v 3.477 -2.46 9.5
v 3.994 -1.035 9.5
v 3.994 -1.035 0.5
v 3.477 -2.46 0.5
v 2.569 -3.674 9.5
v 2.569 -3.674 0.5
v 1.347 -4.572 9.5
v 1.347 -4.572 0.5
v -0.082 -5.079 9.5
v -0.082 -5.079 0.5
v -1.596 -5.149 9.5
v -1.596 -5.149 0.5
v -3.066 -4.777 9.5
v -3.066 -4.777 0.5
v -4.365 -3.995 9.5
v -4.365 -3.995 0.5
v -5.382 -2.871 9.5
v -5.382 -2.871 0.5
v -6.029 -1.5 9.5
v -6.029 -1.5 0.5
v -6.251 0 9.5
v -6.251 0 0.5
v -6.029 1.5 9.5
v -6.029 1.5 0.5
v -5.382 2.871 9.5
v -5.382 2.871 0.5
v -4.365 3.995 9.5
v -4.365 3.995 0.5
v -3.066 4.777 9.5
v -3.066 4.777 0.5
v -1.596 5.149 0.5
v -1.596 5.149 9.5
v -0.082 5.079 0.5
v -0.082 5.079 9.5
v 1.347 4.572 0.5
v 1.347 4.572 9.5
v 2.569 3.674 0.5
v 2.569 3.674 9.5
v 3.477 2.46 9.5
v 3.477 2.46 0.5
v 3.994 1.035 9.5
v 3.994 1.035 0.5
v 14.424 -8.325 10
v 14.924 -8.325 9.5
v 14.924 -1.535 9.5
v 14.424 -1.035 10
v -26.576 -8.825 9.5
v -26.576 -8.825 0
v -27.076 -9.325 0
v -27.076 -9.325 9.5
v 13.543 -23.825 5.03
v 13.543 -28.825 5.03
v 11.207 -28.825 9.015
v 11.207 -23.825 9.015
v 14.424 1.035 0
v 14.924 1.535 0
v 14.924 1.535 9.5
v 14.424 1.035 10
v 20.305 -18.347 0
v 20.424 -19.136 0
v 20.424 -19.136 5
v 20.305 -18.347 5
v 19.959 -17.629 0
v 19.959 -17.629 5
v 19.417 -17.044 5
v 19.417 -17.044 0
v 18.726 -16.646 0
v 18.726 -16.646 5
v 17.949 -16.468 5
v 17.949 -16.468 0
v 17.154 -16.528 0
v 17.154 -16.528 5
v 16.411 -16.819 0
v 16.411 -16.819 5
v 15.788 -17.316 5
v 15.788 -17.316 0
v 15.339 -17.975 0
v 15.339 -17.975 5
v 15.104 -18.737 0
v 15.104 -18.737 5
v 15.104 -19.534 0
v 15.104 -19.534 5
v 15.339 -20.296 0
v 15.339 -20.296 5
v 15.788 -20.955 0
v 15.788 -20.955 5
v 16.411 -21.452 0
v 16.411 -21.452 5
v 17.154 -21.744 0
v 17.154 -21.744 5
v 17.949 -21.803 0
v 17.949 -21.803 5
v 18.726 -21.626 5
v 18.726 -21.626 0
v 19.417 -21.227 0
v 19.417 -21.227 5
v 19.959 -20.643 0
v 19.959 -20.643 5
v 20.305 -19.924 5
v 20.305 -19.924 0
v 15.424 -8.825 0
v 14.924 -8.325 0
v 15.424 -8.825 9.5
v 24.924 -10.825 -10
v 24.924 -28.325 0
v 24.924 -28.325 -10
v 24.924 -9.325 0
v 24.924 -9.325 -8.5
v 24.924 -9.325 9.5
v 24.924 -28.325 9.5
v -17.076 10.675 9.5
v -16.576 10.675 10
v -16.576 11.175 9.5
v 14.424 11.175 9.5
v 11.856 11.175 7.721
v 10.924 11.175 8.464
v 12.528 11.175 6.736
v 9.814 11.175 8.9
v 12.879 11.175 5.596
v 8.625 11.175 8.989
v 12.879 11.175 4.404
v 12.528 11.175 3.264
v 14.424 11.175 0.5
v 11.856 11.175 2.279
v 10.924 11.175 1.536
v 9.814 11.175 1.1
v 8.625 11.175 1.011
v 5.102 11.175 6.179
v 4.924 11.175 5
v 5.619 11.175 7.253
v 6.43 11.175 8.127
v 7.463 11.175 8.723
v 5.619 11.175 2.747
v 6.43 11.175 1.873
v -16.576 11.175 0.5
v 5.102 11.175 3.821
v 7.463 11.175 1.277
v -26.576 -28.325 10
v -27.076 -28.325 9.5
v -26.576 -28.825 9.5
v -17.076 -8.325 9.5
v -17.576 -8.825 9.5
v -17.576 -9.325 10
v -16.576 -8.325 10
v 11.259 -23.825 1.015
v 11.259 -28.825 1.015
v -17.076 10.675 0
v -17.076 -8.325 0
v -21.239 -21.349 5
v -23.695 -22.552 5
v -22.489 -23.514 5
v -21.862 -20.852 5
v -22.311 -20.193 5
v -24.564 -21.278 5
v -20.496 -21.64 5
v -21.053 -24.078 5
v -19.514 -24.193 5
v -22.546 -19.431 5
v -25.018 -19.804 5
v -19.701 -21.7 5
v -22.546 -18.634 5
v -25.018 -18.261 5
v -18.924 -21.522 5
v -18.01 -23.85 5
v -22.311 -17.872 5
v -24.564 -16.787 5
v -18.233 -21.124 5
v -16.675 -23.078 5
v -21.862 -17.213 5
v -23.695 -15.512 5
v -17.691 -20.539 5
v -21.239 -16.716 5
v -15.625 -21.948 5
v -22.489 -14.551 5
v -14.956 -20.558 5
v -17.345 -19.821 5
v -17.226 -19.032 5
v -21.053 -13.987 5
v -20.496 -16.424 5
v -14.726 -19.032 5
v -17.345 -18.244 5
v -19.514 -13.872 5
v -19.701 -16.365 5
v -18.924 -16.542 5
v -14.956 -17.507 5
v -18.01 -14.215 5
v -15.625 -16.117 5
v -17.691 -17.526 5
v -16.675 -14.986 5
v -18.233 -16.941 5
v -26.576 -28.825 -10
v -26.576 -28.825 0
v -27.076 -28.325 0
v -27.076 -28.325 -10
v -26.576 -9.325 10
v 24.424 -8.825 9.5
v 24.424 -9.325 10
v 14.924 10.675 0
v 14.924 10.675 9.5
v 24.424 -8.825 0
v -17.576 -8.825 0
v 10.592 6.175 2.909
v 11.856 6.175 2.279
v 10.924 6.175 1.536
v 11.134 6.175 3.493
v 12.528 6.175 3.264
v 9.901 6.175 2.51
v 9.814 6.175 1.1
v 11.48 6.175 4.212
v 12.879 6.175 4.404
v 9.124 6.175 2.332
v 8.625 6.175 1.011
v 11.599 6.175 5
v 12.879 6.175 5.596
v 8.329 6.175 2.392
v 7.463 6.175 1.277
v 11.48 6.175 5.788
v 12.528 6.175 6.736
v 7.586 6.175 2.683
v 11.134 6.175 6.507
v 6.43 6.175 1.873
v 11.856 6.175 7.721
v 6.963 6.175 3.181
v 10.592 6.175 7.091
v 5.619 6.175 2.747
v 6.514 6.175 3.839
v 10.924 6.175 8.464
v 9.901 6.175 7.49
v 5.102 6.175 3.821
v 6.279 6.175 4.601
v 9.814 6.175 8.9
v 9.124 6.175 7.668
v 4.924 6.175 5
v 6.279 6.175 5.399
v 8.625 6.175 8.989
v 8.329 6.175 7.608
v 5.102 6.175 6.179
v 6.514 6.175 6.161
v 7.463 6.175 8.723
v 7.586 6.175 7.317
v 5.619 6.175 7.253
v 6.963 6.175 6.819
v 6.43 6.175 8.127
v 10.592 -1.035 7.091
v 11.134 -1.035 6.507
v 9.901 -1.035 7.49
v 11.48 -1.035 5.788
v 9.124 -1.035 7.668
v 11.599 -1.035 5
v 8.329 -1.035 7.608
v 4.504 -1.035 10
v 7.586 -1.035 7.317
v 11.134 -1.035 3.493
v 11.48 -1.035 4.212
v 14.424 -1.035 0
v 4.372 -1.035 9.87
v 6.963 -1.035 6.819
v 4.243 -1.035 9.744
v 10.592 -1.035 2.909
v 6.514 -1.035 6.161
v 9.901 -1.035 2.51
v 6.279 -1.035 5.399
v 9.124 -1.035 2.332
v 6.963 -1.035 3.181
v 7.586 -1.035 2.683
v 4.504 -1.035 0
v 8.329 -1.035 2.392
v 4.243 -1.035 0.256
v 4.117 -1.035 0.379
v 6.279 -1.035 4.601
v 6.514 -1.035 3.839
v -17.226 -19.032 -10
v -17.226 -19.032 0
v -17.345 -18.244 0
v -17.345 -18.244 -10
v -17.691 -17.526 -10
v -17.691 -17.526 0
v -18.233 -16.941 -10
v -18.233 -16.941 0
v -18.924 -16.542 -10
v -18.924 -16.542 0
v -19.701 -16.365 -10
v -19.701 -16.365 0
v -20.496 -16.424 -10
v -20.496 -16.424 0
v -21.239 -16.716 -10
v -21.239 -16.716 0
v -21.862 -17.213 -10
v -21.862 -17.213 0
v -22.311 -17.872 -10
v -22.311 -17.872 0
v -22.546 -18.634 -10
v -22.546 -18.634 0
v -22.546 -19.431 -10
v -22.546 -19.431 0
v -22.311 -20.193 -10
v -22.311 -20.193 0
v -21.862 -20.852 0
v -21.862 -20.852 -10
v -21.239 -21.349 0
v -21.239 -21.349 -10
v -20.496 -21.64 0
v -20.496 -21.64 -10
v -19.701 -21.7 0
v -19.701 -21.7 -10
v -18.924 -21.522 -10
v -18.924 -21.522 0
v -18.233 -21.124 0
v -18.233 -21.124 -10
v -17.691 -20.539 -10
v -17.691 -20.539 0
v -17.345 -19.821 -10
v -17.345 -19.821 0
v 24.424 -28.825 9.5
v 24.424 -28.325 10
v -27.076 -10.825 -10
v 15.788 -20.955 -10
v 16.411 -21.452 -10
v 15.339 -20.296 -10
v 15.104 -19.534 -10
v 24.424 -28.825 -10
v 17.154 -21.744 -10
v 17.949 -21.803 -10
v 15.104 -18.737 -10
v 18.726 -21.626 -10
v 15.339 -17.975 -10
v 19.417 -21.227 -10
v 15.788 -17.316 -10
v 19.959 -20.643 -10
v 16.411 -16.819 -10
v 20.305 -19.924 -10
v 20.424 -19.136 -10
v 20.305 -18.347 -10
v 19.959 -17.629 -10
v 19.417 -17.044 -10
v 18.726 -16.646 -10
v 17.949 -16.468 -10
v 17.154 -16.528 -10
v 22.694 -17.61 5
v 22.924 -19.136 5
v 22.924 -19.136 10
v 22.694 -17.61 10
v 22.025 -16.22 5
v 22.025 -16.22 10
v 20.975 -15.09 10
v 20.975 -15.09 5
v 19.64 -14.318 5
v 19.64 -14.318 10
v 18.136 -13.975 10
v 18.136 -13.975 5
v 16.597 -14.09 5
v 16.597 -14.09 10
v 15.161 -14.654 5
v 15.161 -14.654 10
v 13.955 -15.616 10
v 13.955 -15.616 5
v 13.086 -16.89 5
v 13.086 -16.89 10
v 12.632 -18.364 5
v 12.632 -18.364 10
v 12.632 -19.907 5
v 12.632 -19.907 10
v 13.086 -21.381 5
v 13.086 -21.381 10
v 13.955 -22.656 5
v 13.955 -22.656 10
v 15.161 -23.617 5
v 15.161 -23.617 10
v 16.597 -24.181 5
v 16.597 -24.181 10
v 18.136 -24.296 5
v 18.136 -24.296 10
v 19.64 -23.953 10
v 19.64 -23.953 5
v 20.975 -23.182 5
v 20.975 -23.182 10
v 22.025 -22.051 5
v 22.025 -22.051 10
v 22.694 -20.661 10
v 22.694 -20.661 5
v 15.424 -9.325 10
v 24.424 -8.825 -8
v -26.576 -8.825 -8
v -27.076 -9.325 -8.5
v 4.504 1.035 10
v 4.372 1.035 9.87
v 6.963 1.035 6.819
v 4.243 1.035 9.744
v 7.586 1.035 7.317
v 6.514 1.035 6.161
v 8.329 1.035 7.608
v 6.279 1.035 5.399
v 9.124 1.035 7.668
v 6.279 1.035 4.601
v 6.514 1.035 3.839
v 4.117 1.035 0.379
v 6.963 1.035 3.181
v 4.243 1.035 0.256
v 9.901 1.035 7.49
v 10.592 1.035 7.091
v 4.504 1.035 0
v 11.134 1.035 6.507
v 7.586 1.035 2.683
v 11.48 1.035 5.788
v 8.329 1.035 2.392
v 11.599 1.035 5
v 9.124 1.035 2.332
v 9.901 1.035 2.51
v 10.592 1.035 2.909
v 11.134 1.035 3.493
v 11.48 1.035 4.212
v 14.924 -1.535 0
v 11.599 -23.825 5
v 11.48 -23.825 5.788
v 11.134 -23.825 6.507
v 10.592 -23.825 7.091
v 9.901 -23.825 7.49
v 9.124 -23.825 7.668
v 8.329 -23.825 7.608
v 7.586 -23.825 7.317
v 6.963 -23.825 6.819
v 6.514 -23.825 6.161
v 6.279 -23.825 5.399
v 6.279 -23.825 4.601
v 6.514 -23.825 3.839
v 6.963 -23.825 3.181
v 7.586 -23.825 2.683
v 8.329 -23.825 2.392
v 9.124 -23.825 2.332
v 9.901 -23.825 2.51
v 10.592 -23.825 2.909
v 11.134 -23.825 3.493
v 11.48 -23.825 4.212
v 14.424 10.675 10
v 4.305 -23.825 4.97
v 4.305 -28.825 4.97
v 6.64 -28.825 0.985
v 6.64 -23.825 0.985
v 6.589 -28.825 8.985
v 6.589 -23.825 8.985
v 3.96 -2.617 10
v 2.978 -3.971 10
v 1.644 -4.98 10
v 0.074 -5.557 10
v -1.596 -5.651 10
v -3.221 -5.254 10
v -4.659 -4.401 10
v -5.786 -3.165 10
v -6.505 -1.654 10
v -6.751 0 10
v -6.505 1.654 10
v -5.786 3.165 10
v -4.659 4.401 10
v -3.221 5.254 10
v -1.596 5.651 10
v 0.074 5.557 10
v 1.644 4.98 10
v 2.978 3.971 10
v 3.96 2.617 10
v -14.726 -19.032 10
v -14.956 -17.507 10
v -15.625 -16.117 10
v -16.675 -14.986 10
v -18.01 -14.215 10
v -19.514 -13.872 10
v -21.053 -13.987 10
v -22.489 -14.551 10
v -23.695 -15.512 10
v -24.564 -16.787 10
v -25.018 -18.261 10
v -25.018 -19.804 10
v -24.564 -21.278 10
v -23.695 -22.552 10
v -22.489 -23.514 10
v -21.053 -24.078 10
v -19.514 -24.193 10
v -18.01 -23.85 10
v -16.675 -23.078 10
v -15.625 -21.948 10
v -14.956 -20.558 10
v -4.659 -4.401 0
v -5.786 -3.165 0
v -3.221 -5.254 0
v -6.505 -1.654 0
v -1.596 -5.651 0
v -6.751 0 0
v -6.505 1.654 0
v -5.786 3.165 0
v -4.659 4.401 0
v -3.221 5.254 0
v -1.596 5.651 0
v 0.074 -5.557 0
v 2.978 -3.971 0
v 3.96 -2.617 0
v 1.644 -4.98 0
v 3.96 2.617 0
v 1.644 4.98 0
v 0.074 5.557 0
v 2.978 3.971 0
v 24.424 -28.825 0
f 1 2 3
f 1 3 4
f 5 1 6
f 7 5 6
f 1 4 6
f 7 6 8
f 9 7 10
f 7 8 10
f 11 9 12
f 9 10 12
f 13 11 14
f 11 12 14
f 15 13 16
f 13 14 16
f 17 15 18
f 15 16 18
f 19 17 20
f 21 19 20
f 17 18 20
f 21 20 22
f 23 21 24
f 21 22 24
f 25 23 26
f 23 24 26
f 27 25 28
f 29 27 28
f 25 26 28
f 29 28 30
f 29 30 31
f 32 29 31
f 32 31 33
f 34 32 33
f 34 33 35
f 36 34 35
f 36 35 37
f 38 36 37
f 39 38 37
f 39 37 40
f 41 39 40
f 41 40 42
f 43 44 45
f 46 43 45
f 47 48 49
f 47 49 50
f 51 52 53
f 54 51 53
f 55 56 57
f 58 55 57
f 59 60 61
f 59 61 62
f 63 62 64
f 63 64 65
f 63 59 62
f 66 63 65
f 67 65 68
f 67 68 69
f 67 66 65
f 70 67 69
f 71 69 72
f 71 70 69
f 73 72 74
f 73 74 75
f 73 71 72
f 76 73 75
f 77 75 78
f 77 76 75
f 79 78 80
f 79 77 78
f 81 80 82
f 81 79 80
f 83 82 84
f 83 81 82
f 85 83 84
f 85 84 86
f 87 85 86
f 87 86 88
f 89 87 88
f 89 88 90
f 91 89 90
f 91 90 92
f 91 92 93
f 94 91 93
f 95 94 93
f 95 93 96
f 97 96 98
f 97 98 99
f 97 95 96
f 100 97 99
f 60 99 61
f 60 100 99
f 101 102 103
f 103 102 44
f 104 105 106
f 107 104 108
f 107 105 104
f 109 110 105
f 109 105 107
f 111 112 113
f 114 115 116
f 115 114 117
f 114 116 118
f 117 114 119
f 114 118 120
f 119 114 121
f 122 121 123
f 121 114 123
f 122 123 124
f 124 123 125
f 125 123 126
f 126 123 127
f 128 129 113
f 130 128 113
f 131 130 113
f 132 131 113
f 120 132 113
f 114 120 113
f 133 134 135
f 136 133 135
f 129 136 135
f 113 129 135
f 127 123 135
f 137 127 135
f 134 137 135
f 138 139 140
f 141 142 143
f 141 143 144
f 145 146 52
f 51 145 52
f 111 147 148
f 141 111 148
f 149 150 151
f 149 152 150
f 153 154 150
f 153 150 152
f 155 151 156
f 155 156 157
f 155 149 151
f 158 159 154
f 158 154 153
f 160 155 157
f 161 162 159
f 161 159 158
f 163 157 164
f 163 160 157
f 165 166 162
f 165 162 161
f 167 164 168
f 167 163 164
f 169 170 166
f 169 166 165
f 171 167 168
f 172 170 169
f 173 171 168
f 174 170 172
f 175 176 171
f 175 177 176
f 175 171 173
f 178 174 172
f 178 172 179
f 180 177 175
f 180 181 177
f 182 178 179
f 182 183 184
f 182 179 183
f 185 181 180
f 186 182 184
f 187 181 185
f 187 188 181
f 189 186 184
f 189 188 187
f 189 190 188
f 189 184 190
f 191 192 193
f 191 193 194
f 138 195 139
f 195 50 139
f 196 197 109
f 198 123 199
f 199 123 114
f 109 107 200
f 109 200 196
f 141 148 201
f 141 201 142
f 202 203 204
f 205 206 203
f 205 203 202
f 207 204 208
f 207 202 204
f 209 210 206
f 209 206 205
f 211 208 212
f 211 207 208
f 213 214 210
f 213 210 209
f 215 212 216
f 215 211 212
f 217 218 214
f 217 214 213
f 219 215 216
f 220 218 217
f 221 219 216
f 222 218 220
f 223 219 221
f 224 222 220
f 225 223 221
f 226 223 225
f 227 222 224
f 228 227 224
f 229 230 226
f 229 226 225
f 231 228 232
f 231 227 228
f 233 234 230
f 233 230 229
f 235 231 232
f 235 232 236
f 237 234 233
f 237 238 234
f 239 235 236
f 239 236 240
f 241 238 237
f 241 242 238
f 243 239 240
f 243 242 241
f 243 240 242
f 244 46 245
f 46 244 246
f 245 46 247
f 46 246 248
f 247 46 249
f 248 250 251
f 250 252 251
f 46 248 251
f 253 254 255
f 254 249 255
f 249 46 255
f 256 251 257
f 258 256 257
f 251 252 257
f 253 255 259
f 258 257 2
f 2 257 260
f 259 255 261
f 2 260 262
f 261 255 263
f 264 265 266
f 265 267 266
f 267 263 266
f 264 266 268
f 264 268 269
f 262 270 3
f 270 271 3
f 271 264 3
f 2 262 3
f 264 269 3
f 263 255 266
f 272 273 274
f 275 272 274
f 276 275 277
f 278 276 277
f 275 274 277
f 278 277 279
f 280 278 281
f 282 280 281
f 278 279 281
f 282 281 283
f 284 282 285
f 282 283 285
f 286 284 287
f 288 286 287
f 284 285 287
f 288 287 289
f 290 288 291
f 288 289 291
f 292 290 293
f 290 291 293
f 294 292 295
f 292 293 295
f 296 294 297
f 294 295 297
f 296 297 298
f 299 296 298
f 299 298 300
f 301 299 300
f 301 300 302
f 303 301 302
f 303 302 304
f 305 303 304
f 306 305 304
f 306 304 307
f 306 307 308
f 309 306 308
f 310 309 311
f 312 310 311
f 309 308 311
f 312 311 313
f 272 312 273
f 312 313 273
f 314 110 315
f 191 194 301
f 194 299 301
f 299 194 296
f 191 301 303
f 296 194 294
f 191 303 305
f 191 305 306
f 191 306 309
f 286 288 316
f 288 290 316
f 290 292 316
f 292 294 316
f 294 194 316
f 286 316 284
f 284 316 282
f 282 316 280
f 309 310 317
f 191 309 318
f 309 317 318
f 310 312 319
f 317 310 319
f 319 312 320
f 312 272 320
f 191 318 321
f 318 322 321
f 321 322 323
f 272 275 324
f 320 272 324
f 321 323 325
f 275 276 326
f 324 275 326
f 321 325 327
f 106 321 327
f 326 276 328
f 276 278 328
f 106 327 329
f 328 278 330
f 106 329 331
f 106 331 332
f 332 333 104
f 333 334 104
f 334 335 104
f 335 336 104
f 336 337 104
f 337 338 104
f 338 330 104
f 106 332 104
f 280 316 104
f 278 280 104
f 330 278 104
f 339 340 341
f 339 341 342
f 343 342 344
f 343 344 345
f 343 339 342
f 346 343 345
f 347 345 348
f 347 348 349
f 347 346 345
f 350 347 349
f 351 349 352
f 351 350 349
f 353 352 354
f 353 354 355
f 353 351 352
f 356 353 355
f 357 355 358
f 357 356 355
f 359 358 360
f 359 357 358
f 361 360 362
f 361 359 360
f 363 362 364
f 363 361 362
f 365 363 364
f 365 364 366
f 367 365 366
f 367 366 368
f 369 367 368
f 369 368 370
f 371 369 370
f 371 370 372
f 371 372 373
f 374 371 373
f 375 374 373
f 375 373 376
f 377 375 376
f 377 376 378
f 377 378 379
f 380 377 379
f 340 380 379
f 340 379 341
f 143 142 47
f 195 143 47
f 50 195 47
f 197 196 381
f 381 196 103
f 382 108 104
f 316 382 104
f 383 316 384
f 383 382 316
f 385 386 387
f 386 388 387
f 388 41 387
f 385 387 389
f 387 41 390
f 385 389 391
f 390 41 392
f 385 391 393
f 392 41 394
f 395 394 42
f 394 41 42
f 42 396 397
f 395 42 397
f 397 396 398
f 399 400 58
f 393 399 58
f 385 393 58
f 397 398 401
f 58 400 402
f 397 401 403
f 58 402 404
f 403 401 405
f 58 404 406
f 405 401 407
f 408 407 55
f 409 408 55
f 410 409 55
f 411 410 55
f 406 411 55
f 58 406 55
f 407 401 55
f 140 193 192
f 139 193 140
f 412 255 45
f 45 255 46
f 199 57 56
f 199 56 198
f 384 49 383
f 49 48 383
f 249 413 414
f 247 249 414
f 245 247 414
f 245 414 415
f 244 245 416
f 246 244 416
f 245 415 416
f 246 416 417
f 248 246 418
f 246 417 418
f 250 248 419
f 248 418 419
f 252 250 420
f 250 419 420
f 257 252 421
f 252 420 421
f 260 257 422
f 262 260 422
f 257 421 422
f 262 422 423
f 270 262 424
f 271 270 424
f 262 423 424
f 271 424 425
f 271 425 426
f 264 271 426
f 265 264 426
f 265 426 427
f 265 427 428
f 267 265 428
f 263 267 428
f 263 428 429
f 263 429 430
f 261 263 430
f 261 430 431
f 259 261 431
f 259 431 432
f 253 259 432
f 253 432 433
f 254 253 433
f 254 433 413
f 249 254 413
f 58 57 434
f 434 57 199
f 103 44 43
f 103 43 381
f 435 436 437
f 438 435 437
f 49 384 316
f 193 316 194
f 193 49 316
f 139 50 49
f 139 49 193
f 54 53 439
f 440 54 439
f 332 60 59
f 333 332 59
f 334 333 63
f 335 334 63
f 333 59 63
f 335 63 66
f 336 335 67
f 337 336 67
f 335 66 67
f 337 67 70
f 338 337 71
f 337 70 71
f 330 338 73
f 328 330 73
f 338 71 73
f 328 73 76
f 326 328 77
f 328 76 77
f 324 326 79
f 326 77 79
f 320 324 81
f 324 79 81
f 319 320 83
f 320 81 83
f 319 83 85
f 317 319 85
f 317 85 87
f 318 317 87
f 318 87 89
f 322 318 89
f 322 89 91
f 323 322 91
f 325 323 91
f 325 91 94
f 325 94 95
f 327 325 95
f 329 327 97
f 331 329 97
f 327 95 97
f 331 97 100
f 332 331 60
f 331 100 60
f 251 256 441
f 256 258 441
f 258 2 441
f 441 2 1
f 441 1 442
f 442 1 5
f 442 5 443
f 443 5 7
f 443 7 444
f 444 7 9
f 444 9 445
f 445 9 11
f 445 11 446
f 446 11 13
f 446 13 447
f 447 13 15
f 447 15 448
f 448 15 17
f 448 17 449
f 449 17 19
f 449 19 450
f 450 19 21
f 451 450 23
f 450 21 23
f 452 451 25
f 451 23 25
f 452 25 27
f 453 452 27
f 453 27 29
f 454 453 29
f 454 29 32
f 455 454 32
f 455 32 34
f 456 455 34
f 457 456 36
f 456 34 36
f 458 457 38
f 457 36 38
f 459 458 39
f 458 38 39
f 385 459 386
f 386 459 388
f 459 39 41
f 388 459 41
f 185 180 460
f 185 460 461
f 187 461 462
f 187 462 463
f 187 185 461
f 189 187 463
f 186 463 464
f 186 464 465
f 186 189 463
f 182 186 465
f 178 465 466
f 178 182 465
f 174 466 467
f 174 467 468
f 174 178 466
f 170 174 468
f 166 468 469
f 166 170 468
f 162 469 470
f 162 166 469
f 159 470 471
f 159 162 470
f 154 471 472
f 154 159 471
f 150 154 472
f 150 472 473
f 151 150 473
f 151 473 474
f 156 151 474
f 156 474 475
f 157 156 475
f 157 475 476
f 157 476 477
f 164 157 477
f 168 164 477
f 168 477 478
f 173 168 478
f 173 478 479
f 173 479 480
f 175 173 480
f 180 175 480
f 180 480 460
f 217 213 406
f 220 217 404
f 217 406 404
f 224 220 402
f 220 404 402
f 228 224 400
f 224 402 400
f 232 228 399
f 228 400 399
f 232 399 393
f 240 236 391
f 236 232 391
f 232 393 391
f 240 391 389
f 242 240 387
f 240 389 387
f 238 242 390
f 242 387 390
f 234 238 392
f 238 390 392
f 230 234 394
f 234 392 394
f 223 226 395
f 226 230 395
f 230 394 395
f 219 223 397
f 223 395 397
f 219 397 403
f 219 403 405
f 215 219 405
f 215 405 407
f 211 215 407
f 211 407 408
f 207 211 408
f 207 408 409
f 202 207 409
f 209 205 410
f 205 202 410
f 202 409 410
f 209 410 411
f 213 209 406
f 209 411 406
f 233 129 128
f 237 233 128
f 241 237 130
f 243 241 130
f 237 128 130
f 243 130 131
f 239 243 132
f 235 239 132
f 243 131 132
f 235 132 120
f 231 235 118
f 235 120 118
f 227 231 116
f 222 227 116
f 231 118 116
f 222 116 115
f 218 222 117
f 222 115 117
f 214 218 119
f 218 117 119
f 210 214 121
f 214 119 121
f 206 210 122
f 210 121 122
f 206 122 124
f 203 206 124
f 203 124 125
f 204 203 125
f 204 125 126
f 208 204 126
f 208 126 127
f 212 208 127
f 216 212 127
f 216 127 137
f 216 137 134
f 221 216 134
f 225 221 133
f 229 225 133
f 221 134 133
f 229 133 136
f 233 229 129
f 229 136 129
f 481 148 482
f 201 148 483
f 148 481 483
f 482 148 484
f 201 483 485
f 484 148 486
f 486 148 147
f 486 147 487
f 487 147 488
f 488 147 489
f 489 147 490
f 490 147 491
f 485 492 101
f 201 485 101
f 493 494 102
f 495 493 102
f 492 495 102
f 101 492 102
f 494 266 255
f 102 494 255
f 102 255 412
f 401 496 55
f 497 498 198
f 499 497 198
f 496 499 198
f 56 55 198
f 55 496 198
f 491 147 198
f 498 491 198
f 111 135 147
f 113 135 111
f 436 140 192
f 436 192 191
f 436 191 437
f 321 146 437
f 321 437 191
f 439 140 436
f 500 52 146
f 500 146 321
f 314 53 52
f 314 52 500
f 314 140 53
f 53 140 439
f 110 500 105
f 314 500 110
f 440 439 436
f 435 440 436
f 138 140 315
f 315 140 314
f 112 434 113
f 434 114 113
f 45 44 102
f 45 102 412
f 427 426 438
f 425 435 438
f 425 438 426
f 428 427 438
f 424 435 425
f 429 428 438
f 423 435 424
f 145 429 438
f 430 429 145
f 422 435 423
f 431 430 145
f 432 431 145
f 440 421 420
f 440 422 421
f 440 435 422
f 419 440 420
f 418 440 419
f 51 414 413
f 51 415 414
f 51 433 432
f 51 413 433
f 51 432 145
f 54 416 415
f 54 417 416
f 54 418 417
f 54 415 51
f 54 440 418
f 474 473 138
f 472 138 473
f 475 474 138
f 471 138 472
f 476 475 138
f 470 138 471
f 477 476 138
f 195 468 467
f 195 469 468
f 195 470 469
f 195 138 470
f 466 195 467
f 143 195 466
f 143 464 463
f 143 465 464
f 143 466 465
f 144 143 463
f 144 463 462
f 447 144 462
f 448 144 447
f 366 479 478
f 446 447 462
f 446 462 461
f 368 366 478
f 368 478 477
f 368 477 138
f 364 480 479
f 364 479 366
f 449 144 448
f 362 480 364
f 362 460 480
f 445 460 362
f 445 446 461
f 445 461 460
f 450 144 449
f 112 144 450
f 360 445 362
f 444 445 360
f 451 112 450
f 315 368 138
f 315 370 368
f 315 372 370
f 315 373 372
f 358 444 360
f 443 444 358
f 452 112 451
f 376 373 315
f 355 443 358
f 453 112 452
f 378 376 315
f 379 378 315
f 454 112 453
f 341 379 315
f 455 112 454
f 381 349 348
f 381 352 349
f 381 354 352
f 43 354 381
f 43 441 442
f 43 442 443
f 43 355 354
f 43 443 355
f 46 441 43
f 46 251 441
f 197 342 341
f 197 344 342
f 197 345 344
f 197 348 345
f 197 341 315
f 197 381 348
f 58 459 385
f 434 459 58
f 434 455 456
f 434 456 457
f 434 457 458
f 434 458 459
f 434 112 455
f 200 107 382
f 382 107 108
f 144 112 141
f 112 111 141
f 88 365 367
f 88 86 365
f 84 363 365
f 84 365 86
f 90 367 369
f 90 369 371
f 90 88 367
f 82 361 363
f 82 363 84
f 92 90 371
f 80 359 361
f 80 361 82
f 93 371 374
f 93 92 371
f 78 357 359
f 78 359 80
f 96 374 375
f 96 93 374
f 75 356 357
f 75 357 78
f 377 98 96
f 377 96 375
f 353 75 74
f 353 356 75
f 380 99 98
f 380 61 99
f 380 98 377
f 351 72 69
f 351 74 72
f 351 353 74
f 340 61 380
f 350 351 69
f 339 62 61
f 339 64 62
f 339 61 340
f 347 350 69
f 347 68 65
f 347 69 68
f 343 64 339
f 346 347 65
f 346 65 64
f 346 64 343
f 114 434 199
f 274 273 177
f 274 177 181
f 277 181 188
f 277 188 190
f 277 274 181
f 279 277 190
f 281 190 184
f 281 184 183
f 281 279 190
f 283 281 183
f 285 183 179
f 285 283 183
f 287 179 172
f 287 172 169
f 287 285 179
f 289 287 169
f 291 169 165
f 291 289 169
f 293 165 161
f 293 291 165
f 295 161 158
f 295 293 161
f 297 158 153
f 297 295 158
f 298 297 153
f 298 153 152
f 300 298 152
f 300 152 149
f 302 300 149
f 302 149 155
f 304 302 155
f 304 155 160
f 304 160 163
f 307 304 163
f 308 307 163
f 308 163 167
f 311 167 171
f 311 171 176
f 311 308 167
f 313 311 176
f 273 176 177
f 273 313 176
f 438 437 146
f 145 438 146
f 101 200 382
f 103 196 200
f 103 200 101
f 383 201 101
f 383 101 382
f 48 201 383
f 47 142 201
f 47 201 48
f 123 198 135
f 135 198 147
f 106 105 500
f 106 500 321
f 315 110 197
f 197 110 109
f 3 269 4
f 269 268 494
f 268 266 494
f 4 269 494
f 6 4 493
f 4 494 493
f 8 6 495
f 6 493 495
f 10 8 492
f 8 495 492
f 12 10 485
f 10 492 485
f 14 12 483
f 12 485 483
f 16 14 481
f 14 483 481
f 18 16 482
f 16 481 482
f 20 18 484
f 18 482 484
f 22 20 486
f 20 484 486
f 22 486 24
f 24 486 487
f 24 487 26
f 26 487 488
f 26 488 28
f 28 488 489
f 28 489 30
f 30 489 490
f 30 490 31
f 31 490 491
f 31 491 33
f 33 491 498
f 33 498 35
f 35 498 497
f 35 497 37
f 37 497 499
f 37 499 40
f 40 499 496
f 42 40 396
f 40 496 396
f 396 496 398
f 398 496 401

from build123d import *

# Parameters (mm, degrees)
F0_R      = 5.175
F1_DEPTH  = 10
F0_R_2    = 2.675
F2_DEPTH  = 5
F3_DEPTH  = 5
F4_R      = 2.675
F5_DEPTH  = 40
F6_DEPTH  = 5
F7_R      = 4
F7_R_2    = 2.675
F8_DEPTH  = 5
F9_SIZE   = 0.5
F10_DEPTH = 10
F11_DEPTH = 10
F12_SIZE  = 0.49999
F13_SIZE  = 2


# Not quite as in the source:
# - a fillet or chamfer is up to 0.001 mm smaller than in the source, because OpenCascade refuses the exact size


with BuildPart() as f1:
    # F0 (on Top) → F1 (new body)
    with BuildSketch(Plane.XY):
        with BuildLine():
            Line((14.923914507, 11.175), (-17.076085493, 11.175))
            Line((-17.076085493, 11.175), (-17.076085493, -8.825))
            Line((-17.076085493, -8.825), (14.923914507, -8.825))
            Line((14.923914507, -8.825), (14.923914507, -1.035))
            Line((14.923914507, -1.035), (3.9943582746, -1.035))
            ThreePointArc((3.9943582746, -1.035), (-6.251085493, 0), (3.9943582746, 1.035))
            Line((3.9943582746, 1.035), (14.923914507, 1.035))
            Line((14.923914507, 1.035), (14.923914507, 11.175))
        make_face()
        Polygon((14.923914507, -8.825), (-17.076085493, -8.825), (-27.076085493, -8.825), (-27.076085493, -28.825), (-17.076085493, -28.825), (14.923914507, -28.825), (24.923914507, -28.825), (24.923914507, -8.825), align=None)
        with Locations((-19.901085493, -19.0323841524)):
            Circle(F0_R, mode=Mode.SUBTRACT)
        with Locations((17.748914507, -19.1356375643)):
            Circle(F0_R, mode=Mode.SUBTRACT)
    extrude(amount=F1_DEPTH)

    # F0 (on Top) → F2 (join)
    with BuildSketch(Plane.XY):
        with Locations((-19.901085493, -19.0323841524)):
            Circle(F0_R)
        with Locations((-19.901085493, -19.0323841524)):
            Circle(F0_R_2, mode=Mode.SUBTRACT)
    extrude(amount=F2_DEPTH)

    # F0 (on Top) → F3 (join)
    with BuildSketch(Plane.XY):
        with Locations((17.748914507, -19.1356375643)):
            Circle(F0_R)
        with Locations((17.748914507, -19.1356375643)):
            Circle(F0_R_2, mode=Mode.SUBTRACT)
    extrude(amount=F3_DEPTH)

    # F4 (on face) → F5 (cut)
    with BuildSketch(Plane.XZ.offset(28.825)):
        with Locations((8.923914507, 5)):
            Circle(F4_R)
    extrude(amount=-F5_DEPTH, mode=Mode.SUBTRACT)

    # F4 (on face) → F6 (cut)
    with BuildSketch(Plane.XZ.offset(28.825)):
        Polygon((4.3052091527, 4.9700971099), (6.6404584923, 0.9851323855), (11.2591638467, 1.0150352756), (13.5426198614, 5.0299028901), (11.2073705218, 9.0148676145), (6.5886651674, 8.9849647244), align=None)
        with Locations((8.923914507, 5)):
            Circle(F4_R, mode=Mode.SUBTRACT)
    extrude(amount=-F6_DEPTH, mode=Mode.SUBTRACT)

    # F7 (on face) → F8 (cut)
    with BuildSketch(Plane(origin=(0, 11.175, 0), x_dir=(-1, 0, 0), z_dir=(0, 1, 0))):
        with Locations((-8.923914507, 5)):
            Circle(F7_R)
        with Locations((-8.923914507, 5)):
            Circle(F7_R_2, mode=Mode.SUBTRACT)
    extrude(amount=-F8_DEPTH, mode=Mode.SUBTRACT)

    # F9
    f9_edges = [f1.edges().sort_by_distance(p)[0] for p in [
        (-27.076085, -18.825, 10),
        (-22.076085, -8.825, 10),
        (-17.076085, 1.175, 10),
        (-1.076085, 11.175, 10),
        (14.923915, 6.105, 10),
        (14.923915, -4.93, 10),
        (19.923915, -8.825, 10),
        (24.923915, -18.825, 10),
        (24.923915, -8.825, 5),
        (14.923915, -8.825, 5),
        (14.923915, -1.035, 5),
        (14.923915, 1.035, 5),
        (14.923915, 11.175, 5),
        (-17.076085, 11.175, 5),
        (-17.076085, -8.825, 5),
        (-27.076085, -8.825, 5),
        (-27.076085, -28.825, 5),
        (24.923915, -28.825, 5),
        (-6.251085, 0, 10),
        (-1.076085, -28.825, 10),
        (-6.251085, 0, 0),
        (-1.076085, 11.175, 0),
    ]]
    chamfer(f9_edges, length=F9_SIZE)

    # F0 (on Top) → F10 (join)
    with BuildSketch(Plane.XY):
        Polygon((14.923914507, -8.825), (-17.076085493, -8.825), (-27.076085493, -8.825), (-27.076085493, -28.825), (-17.076085493, -28.825), (14.923914507, -28.825), (24.923914507, -28.825), (24.923914507, -8.825), align=None)
        with Locations((-19.901085493, -19.0323841524)):
            Circle(F0_R, mode=Mode.SUBTRACT)
        with Locations((17.748914507, -19.1356375643)):
            Circle(F0_R, mode=Mode.SUBTRACT)
    extrude(amount=-F10_DEPTH)

    # F0 (on Top) → F11 (join)
    with BuildSketch(Plane.XY):
        with Locations((17.748914507, -19.1356375643)):
            Circle(F0_R)
        with Locations((17.748914507, -19.1356375643)):
            Circle(F0_R_2, mode=Mode.SUBTRACT)
        with Locations((-19.901085493, -19.0323841524)):
            Circle(F0_R)
        with Locations((-19.901085493, -19.0323841524)):
            Circle(F0_R_2, mode=Mode.SUBTRACT)
    extrude(amount=-F11_DEPTH)

    # F12 (size 0.5 in the source; OpenCascade refuses exactly that, so slightly less here)
    f12_edges = [f1.edges().sort_by_distance(p)[0] for p in [
        (24.923915, -8.825, -5),
        (-27.076085, -8.825, -5),
        (24.923915, -28.825, -5),
        (-27.076085, -28.825, -5),
    ]]
    chamfer(f12_edges, length=F12_SIZE)

    # F13
    f13_edges = [f1.edges().sort_by_distance(p)[0] for p in [
        (-1.076085, -8.825, -10),
    ]]
    chamfer(f13_edges, length=F13_SIZE)


solid = f1.part
